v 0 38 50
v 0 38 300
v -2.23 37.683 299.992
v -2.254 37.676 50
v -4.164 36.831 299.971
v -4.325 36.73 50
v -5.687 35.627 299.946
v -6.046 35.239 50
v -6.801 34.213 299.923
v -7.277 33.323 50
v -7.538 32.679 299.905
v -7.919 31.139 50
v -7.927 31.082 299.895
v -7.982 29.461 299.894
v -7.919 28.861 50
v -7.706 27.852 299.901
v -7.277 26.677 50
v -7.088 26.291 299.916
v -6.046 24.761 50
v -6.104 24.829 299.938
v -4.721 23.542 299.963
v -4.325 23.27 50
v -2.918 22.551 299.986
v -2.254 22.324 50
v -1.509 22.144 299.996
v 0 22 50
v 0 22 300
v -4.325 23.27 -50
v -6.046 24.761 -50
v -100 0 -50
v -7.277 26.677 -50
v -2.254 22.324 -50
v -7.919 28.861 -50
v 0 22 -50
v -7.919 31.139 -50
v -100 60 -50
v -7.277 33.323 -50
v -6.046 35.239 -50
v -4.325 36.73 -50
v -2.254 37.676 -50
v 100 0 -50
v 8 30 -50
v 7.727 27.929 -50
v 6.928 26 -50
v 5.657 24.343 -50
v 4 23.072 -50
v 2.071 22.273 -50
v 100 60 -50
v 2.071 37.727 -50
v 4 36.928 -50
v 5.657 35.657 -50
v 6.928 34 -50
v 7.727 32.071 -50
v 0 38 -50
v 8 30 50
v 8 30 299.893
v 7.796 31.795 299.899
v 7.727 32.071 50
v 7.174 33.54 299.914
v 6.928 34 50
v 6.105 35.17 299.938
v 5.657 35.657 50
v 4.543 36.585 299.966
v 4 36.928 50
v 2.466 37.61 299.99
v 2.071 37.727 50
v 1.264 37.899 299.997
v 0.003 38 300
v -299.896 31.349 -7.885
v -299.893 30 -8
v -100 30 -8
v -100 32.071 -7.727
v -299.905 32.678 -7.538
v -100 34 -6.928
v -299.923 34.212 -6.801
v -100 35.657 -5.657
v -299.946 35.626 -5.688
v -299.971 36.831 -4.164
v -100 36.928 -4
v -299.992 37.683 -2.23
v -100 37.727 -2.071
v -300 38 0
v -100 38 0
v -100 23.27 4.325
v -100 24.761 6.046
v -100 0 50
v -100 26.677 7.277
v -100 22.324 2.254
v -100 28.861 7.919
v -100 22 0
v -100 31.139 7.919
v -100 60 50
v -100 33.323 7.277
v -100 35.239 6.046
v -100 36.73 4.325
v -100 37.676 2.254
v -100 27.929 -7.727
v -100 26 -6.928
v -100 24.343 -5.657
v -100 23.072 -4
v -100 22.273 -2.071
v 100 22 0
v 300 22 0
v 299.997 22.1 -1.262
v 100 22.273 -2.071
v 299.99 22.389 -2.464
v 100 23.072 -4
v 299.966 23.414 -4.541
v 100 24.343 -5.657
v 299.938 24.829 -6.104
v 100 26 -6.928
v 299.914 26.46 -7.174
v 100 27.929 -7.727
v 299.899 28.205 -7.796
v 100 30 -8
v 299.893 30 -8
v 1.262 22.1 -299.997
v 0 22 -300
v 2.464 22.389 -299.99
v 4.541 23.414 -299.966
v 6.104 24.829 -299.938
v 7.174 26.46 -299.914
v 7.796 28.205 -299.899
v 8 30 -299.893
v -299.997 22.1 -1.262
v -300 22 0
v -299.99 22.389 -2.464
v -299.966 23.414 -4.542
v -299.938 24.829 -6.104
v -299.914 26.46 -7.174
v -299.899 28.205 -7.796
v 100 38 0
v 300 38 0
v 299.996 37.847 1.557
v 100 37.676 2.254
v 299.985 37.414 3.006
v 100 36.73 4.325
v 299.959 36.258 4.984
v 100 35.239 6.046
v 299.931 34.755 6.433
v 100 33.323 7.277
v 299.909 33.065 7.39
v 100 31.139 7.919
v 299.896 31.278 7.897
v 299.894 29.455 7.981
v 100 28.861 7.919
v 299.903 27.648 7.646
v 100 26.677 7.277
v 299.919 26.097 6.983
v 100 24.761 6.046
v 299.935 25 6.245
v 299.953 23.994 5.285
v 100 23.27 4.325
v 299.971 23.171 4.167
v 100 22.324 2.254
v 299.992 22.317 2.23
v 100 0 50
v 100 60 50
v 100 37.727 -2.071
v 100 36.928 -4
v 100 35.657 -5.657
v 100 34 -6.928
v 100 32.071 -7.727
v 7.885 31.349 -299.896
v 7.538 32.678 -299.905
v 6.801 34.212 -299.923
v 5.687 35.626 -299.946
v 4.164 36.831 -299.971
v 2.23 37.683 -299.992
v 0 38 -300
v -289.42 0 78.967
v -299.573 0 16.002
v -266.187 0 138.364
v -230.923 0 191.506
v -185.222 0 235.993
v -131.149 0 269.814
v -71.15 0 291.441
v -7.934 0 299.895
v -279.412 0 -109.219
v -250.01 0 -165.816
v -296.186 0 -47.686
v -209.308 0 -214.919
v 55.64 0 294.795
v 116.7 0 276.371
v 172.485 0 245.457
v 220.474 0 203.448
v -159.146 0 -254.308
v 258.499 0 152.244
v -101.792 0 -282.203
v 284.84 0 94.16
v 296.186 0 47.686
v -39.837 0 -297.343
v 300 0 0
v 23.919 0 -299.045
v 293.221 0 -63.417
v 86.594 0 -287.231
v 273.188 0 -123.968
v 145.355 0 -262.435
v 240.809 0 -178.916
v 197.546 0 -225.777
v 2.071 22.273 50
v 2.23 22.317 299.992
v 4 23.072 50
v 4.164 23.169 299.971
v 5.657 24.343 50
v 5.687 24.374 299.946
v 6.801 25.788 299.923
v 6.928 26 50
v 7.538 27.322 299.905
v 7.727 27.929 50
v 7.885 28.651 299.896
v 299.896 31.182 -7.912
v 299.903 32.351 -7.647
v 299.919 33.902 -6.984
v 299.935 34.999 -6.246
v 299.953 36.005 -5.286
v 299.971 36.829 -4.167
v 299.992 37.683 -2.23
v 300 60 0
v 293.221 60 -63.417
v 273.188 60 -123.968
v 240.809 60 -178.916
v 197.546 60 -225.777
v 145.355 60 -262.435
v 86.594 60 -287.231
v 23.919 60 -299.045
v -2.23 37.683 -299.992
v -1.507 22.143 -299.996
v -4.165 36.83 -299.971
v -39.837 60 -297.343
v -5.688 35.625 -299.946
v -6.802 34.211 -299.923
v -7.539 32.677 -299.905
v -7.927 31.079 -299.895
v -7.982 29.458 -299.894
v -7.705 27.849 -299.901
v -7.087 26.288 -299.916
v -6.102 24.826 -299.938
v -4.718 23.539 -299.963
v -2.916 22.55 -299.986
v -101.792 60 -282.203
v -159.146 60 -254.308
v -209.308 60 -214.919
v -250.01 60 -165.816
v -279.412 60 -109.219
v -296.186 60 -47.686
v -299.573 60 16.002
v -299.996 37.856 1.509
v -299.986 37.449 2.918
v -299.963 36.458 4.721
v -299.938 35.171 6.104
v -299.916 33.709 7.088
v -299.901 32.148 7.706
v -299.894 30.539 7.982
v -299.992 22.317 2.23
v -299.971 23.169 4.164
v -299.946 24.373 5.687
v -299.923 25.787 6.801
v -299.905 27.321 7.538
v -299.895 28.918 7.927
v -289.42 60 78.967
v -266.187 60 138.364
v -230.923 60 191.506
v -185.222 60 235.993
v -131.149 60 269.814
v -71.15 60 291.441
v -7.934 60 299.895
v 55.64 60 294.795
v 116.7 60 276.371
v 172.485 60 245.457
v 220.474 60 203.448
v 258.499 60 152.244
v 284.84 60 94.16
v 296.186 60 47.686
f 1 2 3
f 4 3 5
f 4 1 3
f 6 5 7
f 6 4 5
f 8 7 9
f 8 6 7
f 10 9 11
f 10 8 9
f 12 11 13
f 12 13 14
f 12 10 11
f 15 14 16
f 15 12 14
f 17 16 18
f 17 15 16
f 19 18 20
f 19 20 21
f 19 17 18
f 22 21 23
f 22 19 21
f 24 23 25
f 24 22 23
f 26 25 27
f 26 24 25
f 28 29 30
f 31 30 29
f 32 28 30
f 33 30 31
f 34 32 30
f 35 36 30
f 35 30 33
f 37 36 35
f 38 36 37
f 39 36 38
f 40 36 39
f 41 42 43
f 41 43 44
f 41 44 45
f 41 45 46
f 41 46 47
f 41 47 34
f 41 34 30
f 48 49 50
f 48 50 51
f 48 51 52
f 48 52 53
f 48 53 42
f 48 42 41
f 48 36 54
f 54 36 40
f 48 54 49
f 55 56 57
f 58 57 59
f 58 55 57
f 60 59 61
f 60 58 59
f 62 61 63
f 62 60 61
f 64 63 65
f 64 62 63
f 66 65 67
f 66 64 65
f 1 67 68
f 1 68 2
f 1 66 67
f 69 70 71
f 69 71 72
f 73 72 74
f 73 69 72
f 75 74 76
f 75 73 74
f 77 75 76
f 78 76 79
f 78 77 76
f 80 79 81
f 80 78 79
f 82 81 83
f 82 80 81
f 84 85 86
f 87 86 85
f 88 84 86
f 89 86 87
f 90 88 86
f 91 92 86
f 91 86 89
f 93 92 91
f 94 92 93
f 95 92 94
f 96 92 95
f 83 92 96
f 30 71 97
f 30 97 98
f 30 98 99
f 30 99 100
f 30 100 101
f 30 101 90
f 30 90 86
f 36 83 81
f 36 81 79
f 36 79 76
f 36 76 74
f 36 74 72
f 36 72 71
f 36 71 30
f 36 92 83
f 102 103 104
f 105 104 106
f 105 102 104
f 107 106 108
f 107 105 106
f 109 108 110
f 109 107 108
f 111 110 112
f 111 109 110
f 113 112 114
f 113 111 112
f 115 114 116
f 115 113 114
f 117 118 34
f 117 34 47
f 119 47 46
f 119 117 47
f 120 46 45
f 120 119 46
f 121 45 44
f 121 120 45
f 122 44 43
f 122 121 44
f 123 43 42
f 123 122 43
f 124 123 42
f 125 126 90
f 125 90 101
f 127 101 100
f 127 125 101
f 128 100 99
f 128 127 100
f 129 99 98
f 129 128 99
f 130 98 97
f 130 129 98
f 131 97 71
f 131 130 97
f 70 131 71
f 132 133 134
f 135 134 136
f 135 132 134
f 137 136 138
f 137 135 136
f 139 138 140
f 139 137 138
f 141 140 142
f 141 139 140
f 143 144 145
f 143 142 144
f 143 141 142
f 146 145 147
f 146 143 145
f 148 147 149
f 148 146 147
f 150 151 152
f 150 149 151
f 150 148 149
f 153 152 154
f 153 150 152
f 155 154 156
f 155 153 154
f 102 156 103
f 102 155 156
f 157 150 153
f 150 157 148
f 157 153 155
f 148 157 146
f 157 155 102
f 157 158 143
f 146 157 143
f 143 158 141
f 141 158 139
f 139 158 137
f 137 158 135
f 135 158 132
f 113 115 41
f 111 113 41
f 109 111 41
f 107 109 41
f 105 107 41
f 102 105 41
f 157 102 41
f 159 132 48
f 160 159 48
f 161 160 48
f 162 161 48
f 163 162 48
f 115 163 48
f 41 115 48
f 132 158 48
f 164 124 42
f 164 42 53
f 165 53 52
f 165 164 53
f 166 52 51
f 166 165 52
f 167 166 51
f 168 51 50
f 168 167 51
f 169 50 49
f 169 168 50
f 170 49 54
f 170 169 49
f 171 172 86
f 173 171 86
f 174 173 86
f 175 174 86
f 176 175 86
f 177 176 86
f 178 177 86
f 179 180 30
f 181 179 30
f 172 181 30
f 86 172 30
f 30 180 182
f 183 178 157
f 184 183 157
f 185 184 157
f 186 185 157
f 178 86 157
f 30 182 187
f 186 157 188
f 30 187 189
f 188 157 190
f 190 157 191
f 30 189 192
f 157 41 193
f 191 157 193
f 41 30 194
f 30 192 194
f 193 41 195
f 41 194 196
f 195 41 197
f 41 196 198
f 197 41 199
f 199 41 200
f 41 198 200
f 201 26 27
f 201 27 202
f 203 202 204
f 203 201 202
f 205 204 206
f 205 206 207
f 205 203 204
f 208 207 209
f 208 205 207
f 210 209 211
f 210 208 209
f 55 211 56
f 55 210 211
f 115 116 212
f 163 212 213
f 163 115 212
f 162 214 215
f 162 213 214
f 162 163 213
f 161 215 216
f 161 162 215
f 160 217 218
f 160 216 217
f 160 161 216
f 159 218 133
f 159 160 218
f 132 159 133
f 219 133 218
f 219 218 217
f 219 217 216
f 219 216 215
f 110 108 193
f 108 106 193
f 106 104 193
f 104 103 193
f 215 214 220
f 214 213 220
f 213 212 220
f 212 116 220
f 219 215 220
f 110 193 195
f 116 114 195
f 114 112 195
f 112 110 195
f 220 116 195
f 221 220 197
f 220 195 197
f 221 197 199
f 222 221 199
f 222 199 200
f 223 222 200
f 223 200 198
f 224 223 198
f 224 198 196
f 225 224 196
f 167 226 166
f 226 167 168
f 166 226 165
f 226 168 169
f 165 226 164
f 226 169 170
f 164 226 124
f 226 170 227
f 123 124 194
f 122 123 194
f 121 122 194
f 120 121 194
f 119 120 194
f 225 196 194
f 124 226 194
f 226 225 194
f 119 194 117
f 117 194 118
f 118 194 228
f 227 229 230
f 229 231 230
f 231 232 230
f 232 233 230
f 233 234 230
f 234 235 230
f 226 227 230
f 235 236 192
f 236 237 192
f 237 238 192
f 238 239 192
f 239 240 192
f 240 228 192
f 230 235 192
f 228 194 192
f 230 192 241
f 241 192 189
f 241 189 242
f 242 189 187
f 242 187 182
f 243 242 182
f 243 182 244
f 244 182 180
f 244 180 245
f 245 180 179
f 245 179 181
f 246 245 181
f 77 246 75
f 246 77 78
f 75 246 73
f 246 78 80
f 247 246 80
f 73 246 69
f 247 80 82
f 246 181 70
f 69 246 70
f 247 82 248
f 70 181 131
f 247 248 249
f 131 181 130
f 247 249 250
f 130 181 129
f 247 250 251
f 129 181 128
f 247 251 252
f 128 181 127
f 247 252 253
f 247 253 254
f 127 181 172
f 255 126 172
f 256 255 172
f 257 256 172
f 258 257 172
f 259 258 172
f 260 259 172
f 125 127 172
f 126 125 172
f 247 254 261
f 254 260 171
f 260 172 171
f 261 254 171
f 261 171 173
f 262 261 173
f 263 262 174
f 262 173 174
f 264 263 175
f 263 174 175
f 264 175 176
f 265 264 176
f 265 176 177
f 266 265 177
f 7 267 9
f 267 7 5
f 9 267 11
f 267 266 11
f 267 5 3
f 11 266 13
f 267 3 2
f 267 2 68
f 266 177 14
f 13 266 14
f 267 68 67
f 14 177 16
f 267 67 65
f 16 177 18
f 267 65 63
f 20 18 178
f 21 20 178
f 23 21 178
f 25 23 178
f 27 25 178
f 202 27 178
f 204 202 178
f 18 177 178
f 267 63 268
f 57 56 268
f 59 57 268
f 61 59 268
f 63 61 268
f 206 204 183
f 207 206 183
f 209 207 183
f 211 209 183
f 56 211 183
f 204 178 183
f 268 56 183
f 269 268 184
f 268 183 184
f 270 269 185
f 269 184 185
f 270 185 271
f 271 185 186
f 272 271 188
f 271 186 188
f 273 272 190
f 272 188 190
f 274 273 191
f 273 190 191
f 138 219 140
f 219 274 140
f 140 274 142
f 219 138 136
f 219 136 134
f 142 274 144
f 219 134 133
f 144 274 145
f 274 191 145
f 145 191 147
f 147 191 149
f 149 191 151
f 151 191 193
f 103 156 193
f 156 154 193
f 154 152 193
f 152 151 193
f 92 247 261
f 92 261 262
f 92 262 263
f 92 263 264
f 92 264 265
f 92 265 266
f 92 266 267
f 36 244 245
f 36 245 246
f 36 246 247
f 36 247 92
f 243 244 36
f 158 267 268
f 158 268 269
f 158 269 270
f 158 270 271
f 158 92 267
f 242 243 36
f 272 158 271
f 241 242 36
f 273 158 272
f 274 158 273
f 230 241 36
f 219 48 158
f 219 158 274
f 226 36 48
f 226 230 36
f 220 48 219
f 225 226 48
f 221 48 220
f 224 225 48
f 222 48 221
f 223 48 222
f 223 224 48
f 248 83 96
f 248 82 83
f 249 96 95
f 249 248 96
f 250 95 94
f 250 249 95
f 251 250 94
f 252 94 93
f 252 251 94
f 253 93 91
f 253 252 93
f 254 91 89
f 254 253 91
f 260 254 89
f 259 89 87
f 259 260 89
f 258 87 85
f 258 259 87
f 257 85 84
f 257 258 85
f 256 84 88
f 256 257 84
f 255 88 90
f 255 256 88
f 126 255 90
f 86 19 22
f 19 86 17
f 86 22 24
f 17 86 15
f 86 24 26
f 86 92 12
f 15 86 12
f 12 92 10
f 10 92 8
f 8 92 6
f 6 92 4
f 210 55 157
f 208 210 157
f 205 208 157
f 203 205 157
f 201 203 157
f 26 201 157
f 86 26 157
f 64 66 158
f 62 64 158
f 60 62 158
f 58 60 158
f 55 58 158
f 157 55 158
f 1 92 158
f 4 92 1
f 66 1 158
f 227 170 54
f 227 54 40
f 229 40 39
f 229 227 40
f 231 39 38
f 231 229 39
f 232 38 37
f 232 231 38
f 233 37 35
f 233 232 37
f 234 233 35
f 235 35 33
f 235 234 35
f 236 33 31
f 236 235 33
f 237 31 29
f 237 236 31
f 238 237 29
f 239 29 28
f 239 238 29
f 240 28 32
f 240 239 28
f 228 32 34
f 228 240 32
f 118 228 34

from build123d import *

# Parameters (mm, degrees)
SKETCH_1_RX              = 300
SKETCH_1_RY              = 300
SKETCH_1_R               = 50
EXTRUDE_1_DEPTH          = 60
CUT_EXTRUDE_1_DEPTH      = 429.485705713
CUT_EXTRUDE_1_DEPTH_BACK = 429.485705713
CUT_EXTRUDE_2_DEPTH      = 429.485705867
CUT_EXTRUDE_2_DEPTH_BACK = 429.485705867
SKETCH_4_W               = 200
SKETCH_4_H               = 100
CUT_EXTRUDE_3_DEPTH      = 429.485705867


with BuildPart() as part:
    # 草图1 → 凸台-拉伸1 (new body)
    with BuildSketch(Plane(origin=(0, 0, 0), x_dir=(1, 0, 0), z_dir=(0, 1, 0))):
        with Locations((0, 0)):
            Ellipse(SKETCH_1_RX, SKETCH_1_RY)
        with Locations(Location((0, 0, 0), (0, 0, 270))):
            Circle(SKETCH_1_R, mode=Mode.SUBTRACT)
    extrude(amount=EXTRUDE_1_DEPTH)

    # 草图2 → 切除-拉伸1 (cut, two sides: drawn at the far end of the back side and taken through both)
    with BuildSketch(Plane.XY.offset(-CUT_EXTRUDE_1_DEPTH_BACK)):
        with BuildLine():
            ThreePointArc((0, 38), (-8, 30), (0, 22))
            Line((0, 22), (0, 38))
        make_face()
        with BuildLine():
            Line((0, 38), (0, 22))
            ThreePointArc((0, 22), (5.656854249, 24.343145751), (8, 30))
            ThreePointArc((8, 30), (5.656854249, 35.656854249), (0, 38))
        make_face()
        with BuildLine():
            ThreePointArc((0, 38), (-8, 30), (0, 22))
            Line((0, 22), (0, 38))
        make_face()
        with BuildLine():
            Line((0, 38), (0, 22))
            ThreePointArc((0, 22), (5.656854249, 24.343145751), (8, 30))
            ThreePointArc((8, 30), (5.656854249, 35.656854249), (0, 38))
        make_face()
    extrude(amount=CUT_EXTRUDE_1_DEPTH + CUT_EXTRUDE_1_DEPTH_BACK, mode=Mode.SUBTRACT)

    # 草图3 → 切除-拉伸2 (cut, two sides: drawn at the far end of the back side and taken through both)
    with BuildSketch(Plane(origin=(0, 0, 0), x_dir=(0, 0, -1), z_dir=(1, 0, 0)).offset(-CUT_EXTRUDE_2_DEPTH_BACK)):
        with BuildLine():
            ThreePointArc((0, 38), (-8, 30), (0, 22))
            Line((0, 22), (0, 38))
        make_face()
        with BuildLine():
            Line((0, 38), (0, 22))
            ThreePointArc((0, 22), (5.656854249, 24.343145751), (8, 30))
            ThreePointArc((8, 30), (5.656854249, 35.656854249), (0, 38))
        make_face()
        with BuildLine():
            ThreePointArc((0, 38), (-8, 30), (0, 22))
            Line((0, 22), (0, 38))
        make_face()
        with BuildLine():
            Line((0, 38), (0, 22))
            ThreePointArc((0, 22), (5.656854249, 24.343145751), (8, 30))
            ThreePointArc((8, 30), (5.656854249, 35.656854249), (0, 38))
        make_face()
    extrude(amount=CUT_EXTRUDE_2_DEPTH + CUT_EXTRUDE_2_DEPTH_BACK, mode=Mode.SUBTRACT)

    # 草图4 → 切除-拉伸3 (cut, through all)
    with BuildSketch(Plane(origin=(0, 60, 0), x_dir=(1, 0, 0), z_dir=(0, 1, 0))):
        Rectangle(SKETCH_4_W, SKETCH_4_H)
    extrude(amount=-CUT_EXTRUDE_3_DEPTH, mode=Mode.SUBTRACT)


solid = part.part
